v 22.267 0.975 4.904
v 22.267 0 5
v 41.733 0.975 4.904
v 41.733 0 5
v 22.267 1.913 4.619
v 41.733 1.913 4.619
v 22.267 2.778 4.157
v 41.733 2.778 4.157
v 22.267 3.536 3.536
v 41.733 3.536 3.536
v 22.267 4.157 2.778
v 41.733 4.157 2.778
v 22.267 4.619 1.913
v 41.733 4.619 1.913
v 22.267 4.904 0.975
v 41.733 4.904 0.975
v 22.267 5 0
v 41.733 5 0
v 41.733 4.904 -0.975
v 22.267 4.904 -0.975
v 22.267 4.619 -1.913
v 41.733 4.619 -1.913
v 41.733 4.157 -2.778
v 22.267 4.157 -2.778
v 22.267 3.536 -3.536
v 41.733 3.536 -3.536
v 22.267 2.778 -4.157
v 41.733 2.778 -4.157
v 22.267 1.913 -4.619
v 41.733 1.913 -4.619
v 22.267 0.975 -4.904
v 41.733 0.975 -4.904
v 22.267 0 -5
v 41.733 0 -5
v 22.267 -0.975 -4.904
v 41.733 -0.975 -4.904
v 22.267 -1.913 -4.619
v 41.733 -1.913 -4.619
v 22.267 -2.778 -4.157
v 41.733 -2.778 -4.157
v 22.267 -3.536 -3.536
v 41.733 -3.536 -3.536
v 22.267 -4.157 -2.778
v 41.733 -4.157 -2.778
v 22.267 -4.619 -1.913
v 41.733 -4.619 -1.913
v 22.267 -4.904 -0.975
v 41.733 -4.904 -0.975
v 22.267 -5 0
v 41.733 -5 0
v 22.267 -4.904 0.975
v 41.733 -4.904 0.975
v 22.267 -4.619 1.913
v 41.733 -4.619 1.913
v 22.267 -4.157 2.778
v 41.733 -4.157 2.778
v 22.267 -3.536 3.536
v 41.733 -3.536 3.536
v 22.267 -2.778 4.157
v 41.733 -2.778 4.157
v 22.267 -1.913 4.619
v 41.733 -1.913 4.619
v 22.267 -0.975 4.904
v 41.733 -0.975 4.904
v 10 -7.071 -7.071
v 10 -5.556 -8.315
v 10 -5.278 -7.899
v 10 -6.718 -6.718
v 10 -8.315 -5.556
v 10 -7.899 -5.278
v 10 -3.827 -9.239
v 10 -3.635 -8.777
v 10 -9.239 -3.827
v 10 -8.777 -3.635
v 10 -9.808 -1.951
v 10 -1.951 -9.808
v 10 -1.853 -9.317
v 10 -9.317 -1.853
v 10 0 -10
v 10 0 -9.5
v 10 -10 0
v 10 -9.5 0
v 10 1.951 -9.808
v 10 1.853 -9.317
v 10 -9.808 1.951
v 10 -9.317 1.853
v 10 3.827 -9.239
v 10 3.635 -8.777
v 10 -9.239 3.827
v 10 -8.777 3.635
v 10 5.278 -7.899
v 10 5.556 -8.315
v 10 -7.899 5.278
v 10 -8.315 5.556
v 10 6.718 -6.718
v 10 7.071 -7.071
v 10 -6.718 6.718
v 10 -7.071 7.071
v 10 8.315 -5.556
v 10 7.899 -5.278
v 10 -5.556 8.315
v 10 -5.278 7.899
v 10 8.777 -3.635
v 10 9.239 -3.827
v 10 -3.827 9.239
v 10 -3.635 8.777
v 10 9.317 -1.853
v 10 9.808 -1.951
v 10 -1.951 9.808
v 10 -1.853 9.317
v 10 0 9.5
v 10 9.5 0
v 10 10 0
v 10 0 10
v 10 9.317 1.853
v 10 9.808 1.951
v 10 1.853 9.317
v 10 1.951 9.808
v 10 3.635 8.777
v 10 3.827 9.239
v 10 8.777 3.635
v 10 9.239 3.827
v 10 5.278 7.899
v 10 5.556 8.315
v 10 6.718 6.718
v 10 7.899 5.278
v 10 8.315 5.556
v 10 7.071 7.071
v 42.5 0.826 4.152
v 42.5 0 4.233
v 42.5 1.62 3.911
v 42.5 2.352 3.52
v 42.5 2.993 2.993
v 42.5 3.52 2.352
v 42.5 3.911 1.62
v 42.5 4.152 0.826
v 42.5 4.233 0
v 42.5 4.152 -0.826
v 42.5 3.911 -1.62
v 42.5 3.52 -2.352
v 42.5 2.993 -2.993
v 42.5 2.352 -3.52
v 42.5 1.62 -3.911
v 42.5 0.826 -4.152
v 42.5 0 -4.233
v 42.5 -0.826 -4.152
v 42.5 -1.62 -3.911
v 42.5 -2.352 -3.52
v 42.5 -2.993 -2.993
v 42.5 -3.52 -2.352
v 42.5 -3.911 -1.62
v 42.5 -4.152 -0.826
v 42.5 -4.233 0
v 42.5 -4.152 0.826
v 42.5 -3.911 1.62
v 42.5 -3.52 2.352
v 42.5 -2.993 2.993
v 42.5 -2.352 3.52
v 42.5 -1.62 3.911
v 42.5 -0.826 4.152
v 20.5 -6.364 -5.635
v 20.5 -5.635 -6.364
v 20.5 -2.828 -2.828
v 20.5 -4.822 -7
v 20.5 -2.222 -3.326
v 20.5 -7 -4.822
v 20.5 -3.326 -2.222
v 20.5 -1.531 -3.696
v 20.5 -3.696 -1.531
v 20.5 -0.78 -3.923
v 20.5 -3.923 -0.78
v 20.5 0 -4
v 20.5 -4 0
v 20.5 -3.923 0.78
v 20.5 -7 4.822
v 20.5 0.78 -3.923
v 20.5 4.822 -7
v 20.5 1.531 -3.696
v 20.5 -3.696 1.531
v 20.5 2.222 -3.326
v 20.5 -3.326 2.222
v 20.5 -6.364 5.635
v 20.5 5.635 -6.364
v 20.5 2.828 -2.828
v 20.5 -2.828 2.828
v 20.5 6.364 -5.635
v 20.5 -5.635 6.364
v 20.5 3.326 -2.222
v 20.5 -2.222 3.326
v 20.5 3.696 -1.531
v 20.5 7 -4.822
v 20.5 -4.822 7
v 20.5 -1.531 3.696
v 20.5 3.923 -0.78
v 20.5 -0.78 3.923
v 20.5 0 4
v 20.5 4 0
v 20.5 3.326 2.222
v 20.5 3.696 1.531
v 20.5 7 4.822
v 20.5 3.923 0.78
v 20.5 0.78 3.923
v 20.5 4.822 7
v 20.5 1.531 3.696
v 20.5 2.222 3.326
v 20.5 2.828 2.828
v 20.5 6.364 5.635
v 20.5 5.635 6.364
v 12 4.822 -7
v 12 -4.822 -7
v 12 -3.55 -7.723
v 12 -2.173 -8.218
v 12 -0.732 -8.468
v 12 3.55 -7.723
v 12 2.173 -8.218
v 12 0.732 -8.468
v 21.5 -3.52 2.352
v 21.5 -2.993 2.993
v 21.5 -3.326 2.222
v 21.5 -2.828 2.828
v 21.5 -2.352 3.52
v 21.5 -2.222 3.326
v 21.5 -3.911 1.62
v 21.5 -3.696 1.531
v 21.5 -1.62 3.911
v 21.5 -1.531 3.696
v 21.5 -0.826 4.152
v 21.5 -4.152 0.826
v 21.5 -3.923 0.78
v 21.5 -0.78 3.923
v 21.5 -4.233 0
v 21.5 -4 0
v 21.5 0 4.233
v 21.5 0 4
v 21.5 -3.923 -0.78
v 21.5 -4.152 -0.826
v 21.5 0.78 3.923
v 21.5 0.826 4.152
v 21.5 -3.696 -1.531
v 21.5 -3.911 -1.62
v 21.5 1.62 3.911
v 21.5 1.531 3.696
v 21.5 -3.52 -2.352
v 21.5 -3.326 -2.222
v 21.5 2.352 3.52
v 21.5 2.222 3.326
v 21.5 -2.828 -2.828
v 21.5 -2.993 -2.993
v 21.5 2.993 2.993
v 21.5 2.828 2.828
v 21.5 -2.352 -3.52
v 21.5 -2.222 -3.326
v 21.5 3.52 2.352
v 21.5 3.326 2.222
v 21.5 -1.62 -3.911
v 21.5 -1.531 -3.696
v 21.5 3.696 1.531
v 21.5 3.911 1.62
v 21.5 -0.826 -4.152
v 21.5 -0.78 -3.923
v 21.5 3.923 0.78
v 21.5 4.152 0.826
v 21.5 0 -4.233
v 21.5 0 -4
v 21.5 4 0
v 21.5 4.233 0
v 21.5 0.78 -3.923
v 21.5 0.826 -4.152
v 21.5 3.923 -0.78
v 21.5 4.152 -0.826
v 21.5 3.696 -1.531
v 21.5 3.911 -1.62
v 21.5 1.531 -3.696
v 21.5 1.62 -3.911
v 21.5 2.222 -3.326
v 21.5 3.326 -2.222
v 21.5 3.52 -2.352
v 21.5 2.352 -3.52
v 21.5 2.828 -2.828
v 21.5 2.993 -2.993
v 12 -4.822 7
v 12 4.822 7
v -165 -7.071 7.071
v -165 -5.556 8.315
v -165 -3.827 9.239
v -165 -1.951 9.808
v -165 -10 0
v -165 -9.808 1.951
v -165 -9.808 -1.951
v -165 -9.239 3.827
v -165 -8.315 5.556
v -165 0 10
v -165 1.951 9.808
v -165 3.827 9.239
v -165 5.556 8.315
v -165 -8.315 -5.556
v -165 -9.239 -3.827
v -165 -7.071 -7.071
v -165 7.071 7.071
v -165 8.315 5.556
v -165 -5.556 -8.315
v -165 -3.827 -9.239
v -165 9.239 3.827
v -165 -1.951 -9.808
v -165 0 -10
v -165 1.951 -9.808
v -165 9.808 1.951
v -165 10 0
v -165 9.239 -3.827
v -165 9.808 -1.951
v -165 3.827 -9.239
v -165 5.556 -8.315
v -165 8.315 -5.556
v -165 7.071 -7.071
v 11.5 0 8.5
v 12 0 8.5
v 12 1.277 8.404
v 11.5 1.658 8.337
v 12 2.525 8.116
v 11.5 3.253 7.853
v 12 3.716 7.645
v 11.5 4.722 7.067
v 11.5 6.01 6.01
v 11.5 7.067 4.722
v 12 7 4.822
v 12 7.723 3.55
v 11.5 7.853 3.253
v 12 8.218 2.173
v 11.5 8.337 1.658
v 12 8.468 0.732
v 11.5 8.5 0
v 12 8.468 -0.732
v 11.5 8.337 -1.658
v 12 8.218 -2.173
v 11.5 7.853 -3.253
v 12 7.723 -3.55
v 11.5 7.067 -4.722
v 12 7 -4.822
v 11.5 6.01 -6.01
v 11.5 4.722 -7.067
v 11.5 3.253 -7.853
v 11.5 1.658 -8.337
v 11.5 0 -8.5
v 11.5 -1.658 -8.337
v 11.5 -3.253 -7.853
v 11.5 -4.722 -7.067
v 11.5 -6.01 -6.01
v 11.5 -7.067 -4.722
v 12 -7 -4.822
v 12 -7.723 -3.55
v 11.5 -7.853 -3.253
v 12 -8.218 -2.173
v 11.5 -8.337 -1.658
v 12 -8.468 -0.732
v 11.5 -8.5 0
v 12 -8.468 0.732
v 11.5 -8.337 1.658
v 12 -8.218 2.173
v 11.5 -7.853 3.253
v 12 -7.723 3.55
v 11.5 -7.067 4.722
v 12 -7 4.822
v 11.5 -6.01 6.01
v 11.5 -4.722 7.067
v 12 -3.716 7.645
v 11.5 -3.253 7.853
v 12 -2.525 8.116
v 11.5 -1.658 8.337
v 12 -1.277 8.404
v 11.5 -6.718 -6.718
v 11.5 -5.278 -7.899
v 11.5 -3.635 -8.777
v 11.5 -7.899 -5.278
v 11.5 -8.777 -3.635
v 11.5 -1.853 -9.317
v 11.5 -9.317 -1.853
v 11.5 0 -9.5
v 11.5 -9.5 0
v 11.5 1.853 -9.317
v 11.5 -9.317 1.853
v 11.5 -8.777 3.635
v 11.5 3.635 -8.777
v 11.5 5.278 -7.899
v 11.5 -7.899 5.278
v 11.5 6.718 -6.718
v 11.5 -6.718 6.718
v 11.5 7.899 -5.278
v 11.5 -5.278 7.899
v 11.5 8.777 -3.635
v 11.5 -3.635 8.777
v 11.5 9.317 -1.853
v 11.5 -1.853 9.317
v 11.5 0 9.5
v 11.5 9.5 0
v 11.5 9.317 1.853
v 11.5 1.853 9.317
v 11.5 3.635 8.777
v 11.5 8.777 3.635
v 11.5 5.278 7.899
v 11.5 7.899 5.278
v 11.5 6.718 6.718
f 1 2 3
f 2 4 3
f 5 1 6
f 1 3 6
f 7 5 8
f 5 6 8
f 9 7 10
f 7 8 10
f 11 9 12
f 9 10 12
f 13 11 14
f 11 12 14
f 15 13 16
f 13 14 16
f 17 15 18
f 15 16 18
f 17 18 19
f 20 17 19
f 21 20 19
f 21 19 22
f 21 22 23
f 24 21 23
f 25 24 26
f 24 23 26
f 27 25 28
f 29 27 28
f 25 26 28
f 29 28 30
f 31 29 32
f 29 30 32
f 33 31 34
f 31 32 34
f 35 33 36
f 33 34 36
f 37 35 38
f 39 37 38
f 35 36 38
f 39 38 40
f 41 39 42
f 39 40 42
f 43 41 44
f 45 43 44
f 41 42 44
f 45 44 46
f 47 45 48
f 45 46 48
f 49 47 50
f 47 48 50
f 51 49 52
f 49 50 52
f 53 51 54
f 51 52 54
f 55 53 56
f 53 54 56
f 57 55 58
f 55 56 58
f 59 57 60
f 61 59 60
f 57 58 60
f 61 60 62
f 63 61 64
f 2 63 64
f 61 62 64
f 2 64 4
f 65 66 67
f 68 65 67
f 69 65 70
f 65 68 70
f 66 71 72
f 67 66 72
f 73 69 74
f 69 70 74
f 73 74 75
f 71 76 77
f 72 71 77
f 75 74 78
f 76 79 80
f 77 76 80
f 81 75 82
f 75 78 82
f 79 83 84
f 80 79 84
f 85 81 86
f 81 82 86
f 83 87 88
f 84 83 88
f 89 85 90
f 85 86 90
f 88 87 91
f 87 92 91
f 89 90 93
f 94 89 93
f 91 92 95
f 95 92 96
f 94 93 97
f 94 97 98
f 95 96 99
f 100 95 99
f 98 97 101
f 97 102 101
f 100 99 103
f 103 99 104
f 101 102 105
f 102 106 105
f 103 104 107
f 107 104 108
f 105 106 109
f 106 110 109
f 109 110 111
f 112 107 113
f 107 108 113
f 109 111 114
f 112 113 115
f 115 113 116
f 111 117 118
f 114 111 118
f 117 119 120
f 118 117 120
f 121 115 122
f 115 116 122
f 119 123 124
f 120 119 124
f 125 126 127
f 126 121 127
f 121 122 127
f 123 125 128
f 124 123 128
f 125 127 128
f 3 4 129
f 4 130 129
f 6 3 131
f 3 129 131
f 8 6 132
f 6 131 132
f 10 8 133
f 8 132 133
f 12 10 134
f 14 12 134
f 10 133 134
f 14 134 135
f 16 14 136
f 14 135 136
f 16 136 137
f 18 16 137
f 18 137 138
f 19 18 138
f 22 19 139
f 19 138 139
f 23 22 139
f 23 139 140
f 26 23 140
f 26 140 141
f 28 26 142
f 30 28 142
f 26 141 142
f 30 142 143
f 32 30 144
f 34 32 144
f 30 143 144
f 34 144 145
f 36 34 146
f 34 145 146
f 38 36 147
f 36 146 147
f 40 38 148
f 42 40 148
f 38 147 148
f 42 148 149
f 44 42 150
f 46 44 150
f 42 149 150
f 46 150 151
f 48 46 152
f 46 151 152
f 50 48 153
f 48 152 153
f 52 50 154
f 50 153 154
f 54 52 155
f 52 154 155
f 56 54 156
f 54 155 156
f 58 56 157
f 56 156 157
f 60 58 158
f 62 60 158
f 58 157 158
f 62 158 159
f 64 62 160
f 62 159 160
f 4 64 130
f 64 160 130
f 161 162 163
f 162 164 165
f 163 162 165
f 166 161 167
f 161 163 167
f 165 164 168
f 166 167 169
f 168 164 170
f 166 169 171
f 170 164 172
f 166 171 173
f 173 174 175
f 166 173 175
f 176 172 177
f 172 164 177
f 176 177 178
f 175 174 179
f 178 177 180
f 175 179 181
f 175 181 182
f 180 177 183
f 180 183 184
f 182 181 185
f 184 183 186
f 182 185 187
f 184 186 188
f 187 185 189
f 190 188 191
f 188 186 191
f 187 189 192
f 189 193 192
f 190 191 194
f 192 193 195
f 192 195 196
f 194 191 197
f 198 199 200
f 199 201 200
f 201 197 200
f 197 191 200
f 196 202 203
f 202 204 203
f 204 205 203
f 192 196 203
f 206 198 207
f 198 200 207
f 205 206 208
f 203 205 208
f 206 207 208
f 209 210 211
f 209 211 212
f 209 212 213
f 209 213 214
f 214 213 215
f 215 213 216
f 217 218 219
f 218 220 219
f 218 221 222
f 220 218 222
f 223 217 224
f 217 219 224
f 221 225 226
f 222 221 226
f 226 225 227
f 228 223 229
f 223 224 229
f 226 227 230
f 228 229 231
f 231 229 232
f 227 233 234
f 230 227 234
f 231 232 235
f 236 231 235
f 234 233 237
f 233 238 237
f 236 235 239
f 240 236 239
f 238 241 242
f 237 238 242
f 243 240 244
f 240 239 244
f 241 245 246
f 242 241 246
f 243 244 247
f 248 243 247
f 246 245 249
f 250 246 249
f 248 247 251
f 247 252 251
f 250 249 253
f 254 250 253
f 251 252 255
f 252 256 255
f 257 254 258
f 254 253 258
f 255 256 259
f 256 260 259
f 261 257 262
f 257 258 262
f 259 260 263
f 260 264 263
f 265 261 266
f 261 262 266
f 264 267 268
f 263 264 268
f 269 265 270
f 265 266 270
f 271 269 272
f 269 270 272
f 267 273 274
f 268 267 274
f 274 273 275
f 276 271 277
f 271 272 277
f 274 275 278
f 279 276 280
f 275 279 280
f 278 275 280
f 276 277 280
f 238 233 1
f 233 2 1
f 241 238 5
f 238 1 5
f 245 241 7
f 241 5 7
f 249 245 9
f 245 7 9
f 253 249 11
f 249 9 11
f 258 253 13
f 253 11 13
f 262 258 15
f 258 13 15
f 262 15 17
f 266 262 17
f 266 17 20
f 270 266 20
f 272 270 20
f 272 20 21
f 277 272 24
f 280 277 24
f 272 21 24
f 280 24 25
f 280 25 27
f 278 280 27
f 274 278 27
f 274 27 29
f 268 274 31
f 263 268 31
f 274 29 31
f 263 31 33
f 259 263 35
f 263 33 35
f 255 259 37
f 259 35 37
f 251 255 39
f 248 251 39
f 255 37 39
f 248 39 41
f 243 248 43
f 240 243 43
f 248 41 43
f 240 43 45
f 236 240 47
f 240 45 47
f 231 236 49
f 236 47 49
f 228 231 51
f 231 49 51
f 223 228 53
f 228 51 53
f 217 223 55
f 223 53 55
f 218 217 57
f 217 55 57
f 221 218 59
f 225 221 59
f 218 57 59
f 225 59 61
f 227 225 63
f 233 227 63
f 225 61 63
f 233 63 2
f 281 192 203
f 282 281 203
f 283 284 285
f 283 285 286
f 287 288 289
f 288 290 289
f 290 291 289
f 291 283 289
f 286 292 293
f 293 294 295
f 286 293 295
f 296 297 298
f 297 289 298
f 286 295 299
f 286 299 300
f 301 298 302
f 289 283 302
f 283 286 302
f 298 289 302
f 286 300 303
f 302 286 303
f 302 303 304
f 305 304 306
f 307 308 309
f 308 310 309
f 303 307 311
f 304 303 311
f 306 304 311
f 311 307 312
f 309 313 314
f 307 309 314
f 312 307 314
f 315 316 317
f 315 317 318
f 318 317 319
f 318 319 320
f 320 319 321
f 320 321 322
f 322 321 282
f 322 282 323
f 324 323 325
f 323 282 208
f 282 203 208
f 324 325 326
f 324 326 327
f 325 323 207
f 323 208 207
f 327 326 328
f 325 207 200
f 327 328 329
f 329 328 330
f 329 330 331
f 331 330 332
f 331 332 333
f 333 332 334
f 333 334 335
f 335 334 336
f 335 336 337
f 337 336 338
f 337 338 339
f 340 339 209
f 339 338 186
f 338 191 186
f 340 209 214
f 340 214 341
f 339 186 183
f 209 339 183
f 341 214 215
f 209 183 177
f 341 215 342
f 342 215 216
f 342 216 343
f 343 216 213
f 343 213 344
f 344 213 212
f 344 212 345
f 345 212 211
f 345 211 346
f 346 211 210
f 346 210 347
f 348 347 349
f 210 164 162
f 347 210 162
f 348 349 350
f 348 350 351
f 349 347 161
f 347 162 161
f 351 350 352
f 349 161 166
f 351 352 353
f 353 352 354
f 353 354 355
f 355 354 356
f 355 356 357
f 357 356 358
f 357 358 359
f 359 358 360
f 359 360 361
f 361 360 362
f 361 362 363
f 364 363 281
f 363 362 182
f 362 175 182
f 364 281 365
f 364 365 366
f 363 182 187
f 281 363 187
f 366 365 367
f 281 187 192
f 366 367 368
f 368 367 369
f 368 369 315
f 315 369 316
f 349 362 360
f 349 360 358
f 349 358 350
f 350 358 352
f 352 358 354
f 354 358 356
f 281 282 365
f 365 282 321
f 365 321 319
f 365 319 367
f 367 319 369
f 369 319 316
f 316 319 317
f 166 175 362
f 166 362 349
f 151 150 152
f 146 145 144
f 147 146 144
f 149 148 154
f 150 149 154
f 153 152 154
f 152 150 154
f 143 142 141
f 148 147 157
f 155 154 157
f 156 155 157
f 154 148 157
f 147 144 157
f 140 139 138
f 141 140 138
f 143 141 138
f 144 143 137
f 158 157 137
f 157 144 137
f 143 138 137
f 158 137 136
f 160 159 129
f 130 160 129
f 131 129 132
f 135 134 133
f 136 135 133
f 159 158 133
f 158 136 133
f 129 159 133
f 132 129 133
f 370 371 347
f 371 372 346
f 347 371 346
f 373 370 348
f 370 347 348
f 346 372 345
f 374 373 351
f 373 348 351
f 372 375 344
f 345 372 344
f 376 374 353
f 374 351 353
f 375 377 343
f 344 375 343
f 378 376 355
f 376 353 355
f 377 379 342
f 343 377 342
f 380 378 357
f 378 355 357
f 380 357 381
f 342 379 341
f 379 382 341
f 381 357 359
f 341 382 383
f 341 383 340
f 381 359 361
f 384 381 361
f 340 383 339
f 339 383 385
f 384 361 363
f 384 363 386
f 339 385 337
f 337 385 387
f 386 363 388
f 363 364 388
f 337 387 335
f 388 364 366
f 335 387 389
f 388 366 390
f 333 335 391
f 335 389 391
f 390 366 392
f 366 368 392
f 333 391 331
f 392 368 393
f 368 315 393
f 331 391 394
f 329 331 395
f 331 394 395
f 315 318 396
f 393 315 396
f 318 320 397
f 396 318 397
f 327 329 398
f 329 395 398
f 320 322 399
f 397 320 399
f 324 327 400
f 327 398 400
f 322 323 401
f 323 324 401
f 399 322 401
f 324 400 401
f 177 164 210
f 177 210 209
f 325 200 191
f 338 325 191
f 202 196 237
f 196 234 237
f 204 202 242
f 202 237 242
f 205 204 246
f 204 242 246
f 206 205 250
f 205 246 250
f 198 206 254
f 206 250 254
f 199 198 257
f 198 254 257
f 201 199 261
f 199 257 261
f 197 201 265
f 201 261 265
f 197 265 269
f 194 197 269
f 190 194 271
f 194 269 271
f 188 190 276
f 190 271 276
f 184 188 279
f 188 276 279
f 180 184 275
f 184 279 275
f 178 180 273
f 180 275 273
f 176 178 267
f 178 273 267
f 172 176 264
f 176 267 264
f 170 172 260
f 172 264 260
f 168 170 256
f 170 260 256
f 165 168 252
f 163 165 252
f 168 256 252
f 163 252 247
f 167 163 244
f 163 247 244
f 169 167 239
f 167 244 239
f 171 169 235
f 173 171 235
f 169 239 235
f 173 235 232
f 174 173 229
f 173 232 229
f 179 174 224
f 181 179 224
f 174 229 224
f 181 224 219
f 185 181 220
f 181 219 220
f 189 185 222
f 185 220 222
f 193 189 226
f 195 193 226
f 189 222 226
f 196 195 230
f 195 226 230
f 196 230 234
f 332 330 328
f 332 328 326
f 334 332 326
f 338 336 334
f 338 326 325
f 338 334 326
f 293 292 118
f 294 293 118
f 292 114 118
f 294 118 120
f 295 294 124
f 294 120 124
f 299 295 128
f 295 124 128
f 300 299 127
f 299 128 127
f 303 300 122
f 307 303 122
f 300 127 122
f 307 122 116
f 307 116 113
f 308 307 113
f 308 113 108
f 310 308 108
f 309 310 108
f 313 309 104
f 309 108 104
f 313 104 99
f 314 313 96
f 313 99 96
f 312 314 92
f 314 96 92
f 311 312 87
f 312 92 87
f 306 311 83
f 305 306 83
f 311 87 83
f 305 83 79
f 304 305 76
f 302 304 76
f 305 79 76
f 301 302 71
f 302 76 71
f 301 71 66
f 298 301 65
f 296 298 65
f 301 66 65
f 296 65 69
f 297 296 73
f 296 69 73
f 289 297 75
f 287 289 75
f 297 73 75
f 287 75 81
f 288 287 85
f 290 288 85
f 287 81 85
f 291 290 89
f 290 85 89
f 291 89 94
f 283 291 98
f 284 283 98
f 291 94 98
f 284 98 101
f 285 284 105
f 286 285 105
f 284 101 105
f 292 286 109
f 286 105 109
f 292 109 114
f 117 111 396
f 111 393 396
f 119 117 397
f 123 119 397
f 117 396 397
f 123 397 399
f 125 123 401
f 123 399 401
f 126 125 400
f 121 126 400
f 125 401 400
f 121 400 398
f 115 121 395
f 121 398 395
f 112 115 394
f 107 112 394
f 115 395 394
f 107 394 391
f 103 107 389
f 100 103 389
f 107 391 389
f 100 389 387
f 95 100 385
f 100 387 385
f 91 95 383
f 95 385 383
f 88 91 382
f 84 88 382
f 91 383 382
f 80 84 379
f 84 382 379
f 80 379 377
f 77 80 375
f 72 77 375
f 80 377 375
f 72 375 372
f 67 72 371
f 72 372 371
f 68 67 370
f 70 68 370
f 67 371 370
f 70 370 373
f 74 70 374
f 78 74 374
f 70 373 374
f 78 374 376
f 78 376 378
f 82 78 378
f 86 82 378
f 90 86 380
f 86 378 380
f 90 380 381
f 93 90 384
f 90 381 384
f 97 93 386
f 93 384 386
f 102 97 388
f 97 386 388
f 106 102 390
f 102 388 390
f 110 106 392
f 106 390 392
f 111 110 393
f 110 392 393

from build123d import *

# Parameters (mm, degrees)
SKETCH2_R          = 11
SKETCH2_W          = 14
SKETCH2_H          = 14
CUT_EXTRUDE1_DEPTH = 8.5


with BuildPart() as part:
    # Sketch1 → Revolve1 (revolve)
    with BuildSketch(Plane.XY, mode=Mode.PRIVATE) as revolve1_sk:
        Polygon((-165, 0), (-165, 10), (10, 10), (10, 9.5), (11.5, 9.5), (11.5, 8.5), (20.5, 8.5), (20.5, 4), (21.5, 4), (21.5, 4.233), (22.267, 5), (41.733, 5), (42.5, 4.233), (42.5, 0), align=None)
    revolve(revolve1_sk.sketch.rotate(Axis((42.5, 0, 0), (-1, 0, 0)), 270), axis=Axis((42.5, 0, 0), (-1, 0, 0)))

    # Sketch2 → Cut-Extrude1 (cut)
    with BuildSketch(Plane(origin=(20.5, 0, 0), x_dir=(0, 0, -1), z_dir=(1, 0, 0))):
        Circle(SKETCH2_R)
        Rectangle(SKETCH2_W, SKETCH2_H, mode=Mode.SUBTRACT)
    extrude(amount=-CUT_EXTRUDE1_DEPTH, mode=Mode.SUBTRACT)


solid = part.part
